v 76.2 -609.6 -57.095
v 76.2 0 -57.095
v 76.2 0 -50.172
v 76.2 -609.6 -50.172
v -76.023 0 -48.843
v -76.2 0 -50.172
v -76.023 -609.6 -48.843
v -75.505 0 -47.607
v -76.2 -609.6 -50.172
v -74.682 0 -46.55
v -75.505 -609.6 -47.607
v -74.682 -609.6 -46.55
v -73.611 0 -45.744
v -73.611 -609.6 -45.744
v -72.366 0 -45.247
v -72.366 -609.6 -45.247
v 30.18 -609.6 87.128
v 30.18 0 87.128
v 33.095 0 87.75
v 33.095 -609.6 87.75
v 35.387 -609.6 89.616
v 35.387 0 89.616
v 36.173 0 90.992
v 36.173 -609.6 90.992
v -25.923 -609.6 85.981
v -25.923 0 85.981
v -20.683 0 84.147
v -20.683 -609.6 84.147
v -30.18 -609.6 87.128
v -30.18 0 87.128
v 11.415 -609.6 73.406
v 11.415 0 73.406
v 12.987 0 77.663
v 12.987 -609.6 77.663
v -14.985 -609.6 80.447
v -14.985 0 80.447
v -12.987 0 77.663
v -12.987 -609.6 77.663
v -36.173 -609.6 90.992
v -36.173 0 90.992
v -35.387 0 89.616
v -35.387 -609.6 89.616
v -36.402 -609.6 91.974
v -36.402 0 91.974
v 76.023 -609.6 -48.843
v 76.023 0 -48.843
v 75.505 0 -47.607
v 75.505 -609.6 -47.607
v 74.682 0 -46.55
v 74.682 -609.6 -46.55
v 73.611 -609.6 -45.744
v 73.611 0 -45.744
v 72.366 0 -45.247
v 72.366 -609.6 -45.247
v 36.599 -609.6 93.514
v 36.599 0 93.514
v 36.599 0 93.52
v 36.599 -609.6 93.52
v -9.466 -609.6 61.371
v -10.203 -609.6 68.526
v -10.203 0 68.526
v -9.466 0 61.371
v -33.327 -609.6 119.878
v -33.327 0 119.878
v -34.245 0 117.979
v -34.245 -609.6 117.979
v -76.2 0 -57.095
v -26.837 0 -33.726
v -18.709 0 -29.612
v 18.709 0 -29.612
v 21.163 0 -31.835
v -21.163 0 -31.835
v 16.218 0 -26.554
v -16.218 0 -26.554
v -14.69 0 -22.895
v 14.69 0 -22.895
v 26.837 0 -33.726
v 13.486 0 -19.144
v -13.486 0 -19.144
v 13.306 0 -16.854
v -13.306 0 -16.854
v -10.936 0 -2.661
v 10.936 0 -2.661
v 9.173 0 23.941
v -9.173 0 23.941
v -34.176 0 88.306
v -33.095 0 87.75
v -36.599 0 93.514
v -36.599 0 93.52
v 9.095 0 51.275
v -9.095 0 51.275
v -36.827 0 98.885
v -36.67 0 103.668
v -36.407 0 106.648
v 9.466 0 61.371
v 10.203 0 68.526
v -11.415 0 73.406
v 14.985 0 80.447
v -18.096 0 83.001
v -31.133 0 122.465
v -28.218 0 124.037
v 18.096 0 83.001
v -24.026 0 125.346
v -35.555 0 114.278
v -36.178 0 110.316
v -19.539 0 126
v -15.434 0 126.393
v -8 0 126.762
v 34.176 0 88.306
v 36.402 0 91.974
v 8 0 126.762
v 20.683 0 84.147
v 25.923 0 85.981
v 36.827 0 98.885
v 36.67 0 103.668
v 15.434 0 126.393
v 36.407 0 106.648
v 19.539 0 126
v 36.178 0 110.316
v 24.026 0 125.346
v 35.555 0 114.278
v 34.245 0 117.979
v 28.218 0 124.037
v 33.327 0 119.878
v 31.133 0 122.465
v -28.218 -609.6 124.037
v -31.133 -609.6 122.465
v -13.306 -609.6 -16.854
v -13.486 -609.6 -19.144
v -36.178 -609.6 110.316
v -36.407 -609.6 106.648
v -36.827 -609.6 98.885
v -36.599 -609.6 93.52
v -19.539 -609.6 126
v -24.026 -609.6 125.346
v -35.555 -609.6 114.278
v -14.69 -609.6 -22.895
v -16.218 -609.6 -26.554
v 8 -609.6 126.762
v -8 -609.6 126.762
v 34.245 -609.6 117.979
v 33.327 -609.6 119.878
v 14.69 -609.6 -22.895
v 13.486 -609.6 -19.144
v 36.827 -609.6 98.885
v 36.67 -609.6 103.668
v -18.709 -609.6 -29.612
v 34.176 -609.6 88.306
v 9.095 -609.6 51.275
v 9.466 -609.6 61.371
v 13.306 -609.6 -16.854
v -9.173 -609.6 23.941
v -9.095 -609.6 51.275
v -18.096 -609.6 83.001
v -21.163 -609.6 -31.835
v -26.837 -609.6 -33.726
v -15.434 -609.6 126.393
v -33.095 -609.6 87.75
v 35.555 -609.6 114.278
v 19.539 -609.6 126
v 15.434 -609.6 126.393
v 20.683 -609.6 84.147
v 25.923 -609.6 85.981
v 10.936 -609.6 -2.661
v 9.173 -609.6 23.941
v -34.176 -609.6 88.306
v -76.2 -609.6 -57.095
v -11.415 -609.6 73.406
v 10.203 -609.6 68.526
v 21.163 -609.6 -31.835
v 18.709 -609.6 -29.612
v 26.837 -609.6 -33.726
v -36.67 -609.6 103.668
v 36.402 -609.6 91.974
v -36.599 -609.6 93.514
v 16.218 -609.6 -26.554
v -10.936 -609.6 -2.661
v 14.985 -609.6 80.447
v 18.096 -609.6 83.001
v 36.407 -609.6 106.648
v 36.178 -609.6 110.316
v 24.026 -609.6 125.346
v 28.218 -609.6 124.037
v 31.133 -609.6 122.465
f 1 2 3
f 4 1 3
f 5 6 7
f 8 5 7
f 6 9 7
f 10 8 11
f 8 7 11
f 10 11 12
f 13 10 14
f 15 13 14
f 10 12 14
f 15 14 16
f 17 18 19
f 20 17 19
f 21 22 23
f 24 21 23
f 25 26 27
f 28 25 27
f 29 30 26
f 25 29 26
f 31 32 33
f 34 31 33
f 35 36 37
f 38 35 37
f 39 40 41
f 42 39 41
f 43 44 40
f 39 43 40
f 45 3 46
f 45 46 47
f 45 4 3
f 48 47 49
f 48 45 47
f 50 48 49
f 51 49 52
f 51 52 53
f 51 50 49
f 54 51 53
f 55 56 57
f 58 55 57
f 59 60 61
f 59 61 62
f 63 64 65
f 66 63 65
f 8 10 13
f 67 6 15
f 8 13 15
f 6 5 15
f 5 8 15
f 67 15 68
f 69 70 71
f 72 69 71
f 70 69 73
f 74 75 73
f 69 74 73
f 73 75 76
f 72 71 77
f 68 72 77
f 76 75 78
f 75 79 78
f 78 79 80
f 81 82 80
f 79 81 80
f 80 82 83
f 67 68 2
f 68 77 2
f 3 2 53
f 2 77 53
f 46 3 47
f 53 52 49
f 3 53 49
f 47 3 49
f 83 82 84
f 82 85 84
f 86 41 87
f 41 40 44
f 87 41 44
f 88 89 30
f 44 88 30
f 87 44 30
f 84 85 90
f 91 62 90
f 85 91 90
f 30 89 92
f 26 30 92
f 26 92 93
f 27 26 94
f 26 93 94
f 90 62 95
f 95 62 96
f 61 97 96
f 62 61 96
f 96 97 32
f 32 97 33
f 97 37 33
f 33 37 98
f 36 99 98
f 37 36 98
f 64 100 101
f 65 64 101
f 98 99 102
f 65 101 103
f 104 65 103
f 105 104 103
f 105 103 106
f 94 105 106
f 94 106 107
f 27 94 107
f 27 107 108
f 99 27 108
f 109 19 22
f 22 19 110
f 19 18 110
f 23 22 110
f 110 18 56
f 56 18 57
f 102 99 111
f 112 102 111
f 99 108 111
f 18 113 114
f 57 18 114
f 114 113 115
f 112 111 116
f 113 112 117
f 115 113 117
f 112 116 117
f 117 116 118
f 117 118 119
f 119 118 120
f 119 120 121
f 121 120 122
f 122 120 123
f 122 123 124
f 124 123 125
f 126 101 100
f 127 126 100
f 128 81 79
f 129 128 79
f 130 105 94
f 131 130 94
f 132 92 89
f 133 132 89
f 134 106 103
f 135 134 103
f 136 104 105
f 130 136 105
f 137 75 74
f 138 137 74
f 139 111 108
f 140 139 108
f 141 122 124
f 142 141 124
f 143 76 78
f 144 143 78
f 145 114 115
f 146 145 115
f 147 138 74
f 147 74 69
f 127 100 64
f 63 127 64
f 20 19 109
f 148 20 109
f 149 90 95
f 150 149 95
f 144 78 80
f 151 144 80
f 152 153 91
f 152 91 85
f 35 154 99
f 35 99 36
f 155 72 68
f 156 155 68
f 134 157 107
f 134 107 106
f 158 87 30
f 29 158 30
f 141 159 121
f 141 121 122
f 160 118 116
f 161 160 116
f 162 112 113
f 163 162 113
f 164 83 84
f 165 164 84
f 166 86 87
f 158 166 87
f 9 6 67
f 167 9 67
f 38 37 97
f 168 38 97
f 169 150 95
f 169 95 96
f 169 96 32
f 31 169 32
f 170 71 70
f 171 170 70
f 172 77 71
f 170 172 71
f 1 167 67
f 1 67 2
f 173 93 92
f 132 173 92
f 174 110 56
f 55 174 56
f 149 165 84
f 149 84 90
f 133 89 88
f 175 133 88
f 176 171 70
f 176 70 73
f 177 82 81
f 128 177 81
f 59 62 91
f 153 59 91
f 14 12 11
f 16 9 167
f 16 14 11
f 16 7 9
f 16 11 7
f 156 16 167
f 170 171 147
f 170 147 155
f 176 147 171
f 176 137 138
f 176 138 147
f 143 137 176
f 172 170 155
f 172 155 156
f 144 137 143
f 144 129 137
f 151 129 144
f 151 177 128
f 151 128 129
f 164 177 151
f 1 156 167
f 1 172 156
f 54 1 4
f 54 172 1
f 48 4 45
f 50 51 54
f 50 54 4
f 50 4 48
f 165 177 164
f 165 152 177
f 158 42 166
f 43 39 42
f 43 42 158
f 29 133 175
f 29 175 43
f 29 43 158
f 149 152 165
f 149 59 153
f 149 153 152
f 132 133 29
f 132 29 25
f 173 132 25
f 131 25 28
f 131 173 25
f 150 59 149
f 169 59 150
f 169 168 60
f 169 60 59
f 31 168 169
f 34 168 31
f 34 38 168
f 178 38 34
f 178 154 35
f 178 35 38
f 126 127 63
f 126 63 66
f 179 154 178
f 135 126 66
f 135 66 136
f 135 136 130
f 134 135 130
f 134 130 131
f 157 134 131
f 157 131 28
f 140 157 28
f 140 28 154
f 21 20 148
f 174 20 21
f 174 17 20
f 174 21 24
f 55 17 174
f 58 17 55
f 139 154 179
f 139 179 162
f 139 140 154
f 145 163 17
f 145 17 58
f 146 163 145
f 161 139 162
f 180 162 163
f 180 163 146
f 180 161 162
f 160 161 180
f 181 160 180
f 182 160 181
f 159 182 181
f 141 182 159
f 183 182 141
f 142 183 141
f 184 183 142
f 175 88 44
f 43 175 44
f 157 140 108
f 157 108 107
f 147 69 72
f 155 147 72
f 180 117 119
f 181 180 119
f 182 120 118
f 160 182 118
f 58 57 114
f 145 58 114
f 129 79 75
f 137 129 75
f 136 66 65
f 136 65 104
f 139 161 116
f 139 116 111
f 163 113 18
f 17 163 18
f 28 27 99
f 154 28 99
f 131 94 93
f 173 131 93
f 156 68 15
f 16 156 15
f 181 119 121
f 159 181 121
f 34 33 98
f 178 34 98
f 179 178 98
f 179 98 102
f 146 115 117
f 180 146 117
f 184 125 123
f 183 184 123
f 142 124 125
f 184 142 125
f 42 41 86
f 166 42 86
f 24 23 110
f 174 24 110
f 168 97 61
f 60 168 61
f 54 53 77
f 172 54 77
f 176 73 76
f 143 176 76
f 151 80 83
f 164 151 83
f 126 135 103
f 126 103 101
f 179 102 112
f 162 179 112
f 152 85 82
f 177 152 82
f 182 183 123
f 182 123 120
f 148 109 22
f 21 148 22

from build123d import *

# Parameters (mm, degrees)
F1_DEPTH = 609.6
F2_R     = 5.08


with BuildPart() as f1:
    # F0 (on Front) → F1 (new body)
    with BuildSketch(Plane.XZ):
        Polygon((-76.2, -46.21704), (-76.2, -57.094753), (76.2, -57.094753), (76.2, -46.21704), (26.83735, -33.72637), (21.163462, -31.835258), (18.708812, -29.612178), (16.218112, -26.55388), (14.689744, -22.895062), (13.485576, -19.143616), (13.305501, -16.85449), (10.935693, -2.660843), (9.173225, 23.941404), (9.095304, 51.274587), (9.465817, 61.371074), (10.203332, 68.52603), (11.415046, 73.405639), (12.987001, 77.66302), (14.984693, 80.446691), (18.095852, 83.001115), (20.683027, 84.147327), (25.922873, 85.98128), (30.180251, 87.1275), (33.094916, 87.749728), (34.175634, 88.306465), (35.387348, 89.616426), (36.173157, 90.991981), (36.40228, 91.97448), (36.598587, 93.513711), (36.598872, 93.52041), (36.827176, 98.88458), (36.669851, 103.667696), (36.407496, 106.64783), (36.177806, 110.315693), (35.555092, 114.278253), (34.24468, 117.978737), (33.327476, 119.878062), (31.132972, 122.464971), (28.218115, 124.036569), (24.026078, 125.34602), (19.539378, 126.000454), (15.433662, 126.392808), (7.999516, 126.762047), (0, 126.762047), (-7.999516, 126.762047), (-15.433662, 126.392808), (-19.539378, 126.000454), (-24.026078, 125.34602), (-28.218115, 124.036569), (-31.132972, 122.464971), (-33.327476, 119.878062), (-34.24468, 117.978737), (-35.555092, 114.278253), (-36.177806, 110.315693), (-36.407496, 106.64783), (-36.669851, 103.667696), (-36.827176, 98.88458), (-36.598872, 93.52041), (-36.598587, 93.513711), (-36.40228, 91.97448), (-36.173157, 90.991981), (-35.387348, 89.616426), (-34.175634, 88.306465), (-33.094916, 87.749728), (-30.180251, 87.1275), (-25.922873, 85.98128), (-20.683027, 84.147327), (-18.095852, 83.001115), (-14.984693, 80.446691), (-12.987001, 77.66302), (-11.415046, 73.405639), (-10.203332, 68.52603), (-9.465817, 61.371074), (-9.095304, 51.274587), (-9.173225, 23.941404), (-10.935693, -2.660843), (-13.305501, -16.85449), (-13.485576, -19.143616), (-14.689744, -22.895062), (-16.218112, -26.55388), (-18.708812, -29.612178), (-21.163462, -31.835258), (-26.83735, -33.72637), align=None)
    extrude(amount=F1_DEPTH)

    # F2
    f2_edges = [f1.edges().sort_by_distance(p)[0] for p in [
        (76.2, -304.8, -46.21704),
        (-76.2, -304.8, -46.21704),
    ]]
    fillet(f2_edges, radius=F2_R)


solid = f1.part
